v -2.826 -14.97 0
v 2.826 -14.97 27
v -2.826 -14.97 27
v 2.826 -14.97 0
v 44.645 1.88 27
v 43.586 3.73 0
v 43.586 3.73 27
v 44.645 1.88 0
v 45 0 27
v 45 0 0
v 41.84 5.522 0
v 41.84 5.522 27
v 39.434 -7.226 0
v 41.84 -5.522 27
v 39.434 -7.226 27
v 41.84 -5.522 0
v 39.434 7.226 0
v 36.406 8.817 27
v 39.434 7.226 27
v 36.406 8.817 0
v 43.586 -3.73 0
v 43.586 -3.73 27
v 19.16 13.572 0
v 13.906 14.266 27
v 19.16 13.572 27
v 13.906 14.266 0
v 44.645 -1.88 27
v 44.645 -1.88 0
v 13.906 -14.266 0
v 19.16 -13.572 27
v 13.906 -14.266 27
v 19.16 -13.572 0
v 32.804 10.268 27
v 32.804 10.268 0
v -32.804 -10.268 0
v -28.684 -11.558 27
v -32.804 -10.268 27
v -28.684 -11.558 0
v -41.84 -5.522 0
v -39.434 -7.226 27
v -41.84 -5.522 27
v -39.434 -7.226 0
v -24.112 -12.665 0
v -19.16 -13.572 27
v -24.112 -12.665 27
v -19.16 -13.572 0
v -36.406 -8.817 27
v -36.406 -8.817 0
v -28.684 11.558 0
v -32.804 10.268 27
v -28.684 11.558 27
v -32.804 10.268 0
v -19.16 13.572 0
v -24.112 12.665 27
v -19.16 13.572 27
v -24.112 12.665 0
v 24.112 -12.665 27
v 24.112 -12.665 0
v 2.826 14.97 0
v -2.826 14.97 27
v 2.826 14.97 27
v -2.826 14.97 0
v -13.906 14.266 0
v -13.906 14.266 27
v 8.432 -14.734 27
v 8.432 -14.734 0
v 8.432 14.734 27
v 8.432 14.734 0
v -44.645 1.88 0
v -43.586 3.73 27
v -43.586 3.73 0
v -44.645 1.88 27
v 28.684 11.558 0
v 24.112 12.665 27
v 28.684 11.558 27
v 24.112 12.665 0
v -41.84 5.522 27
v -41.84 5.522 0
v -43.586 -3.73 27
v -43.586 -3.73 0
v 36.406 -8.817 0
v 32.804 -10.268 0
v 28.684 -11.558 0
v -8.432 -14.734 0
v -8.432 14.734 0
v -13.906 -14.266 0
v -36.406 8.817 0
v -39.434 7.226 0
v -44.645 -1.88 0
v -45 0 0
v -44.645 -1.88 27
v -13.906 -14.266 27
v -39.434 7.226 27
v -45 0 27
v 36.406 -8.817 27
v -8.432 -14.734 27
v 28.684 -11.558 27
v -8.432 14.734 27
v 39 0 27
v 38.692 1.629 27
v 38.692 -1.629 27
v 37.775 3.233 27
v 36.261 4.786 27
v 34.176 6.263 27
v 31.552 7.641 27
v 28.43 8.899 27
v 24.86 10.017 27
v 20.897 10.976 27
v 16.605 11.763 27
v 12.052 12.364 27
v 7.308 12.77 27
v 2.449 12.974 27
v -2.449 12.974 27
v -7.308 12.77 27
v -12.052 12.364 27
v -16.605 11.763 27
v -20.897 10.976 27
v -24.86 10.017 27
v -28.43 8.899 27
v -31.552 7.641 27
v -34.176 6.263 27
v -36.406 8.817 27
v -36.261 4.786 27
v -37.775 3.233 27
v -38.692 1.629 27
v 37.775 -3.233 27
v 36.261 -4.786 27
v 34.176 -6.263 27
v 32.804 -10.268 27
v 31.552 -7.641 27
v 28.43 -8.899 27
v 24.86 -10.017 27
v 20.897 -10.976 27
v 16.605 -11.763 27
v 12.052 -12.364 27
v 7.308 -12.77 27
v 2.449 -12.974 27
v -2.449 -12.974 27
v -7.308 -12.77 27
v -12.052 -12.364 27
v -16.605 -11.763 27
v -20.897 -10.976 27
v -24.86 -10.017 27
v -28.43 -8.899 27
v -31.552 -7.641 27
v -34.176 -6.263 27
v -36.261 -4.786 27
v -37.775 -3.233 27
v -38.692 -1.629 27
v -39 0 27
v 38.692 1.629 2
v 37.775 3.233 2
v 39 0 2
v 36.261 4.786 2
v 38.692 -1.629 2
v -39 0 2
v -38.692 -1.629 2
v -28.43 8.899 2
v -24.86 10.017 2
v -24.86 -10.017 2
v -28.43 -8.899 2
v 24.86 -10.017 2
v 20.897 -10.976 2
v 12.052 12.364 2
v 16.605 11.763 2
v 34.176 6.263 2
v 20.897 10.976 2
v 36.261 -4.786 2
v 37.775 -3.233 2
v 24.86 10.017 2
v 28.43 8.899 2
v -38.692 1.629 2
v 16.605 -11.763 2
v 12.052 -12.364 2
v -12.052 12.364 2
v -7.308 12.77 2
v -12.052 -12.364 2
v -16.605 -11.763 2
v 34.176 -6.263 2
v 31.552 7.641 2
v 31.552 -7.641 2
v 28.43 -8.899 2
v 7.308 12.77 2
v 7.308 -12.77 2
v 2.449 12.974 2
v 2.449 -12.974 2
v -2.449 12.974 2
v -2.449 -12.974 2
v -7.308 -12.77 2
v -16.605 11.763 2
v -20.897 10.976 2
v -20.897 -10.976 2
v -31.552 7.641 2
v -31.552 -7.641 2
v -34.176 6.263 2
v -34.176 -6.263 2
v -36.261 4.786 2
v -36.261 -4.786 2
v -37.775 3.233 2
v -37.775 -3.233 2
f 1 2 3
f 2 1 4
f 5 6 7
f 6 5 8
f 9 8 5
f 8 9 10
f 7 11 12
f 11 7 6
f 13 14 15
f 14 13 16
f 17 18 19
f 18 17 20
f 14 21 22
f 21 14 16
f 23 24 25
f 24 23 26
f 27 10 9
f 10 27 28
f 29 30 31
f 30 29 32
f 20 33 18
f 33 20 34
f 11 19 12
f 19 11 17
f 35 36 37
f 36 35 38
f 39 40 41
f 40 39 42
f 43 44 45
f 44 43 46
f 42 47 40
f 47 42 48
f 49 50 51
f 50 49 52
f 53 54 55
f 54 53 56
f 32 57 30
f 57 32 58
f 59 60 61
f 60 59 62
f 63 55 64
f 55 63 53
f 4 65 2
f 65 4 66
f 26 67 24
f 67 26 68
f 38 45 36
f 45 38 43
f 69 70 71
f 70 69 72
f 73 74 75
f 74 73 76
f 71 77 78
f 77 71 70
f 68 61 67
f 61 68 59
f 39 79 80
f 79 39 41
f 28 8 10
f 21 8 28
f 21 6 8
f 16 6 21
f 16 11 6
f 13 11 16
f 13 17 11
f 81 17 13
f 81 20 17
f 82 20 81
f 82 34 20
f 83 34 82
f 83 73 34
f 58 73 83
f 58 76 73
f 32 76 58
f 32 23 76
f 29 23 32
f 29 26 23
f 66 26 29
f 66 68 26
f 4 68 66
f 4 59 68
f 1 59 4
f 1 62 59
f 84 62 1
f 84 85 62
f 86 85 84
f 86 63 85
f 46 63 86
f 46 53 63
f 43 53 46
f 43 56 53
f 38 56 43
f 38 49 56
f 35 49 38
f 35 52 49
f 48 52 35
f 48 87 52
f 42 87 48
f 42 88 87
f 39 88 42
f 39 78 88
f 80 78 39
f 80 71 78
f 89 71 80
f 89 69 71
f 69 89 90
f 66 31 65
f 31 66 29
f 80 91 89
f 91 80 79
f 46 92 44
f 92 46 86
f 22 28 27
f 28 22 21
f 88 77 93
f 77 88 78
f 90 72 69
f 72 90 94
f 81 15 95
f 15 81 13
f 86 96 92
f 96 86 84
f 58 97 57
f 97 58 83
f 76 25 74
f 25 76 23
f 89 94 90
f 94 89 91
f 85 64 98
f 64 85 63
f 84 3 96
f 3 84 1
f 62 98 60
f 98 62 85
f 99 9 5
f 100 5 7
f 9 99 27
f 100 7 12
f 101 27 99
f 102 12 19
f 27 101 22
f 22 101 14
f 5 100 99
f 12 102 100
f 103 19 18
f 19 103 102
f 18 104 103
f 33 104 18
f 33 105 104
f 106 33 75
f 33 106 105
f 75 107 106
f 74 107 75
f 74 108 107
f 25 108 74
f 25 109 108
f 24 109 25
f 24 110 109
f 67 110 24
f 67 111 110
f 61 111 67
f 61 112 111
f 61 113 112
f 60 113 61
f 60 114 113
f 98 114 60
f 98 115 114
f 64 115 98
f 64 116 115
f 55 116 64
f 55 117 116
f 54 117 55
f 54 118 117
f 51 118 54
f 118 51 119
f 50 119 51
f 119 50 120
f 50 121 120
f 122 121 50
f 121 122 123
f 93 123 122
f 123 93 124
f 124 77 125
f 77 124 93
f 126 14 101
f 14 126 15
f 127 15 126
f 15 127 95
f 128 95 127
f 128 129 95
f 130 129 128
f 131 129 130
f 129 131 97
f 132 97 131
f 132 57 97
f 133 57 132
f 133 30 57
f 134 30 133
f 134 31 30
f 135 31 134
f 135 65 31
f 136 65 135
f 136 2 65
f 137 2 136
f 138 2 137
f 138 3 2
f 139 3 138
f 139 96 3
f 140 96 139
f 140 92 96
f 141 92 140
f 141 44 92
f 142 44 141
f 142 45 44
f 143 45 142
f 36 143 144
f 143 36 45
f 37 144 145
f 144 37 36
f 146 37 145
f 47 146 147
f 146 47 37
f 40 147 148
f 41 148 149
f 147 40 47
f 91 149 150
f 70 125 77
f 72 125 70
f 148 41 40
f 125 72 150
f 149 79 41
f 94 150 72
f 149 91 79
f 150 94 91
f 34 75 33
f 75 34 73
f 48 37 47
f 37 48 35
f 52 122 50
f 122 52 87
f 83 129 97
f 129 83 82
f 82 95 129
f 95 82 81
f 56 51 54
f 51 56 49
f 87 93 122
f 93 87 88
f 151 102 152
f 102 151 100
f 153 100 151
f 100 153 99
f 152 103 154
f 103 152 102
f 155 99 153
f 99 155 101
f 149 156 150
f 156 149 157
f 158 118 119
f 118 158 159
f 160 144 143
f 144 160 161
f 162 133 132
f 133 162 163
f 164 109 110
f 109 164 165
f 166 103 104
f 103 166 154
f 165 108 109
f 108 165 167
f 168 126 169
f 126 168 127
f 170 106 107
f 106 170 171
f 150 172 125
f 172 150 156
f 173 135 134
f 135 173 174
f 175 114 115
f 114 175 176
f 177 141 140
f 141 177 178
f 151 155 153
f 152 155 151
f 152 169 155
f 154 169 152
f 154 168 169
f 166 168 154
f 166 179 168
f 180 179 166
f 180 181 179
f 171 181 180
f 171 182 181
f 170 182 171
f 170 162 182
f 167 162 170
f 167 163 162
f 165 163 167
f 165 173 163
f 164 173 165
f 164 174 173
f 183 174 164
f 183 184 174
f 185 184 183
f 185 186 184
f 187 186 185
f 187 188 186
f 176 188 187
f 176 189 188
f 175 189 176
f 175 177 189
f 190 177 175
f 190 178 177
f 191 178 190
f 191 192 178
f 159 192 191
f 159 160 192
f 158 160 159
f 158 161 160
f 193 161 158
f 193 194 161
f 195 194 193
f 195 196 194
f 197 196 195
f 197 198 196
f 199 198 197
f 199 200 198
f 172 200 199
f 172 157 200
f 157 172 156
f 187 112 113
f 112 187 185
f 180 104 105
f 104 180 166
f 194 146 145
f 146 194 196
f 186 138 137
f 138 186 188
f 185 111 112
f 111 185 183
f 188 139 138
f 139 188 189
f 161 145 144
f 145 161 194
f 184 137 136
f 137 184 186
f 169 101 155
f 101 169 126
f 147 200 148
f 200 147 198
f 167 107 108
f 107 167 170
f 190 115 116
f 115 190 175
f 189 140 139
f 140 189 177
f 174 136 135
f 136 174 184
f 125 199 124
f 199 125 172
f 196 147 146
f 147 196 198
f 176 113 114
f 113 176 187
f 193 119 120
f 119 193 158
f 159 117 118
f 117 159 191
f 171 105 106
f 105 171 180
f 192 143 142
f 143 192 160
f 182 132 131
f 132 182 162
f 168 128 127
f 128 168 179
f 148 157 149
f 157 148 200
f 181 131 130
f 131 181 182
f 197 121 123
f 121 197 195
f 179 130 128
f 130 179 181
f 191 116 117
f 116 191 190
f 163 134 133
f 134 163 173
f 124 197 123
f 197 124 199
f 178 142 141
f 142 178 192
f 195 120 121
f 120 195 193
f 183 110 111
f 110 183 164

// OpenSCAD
scale([3,1,1])
difference(){
cylinder(h=27,r1=15,r2=15,$fn=50);
    translate([0,0,2])
    cylinder(h=25.5,r1=13,r2=13,$fn=50);
}
